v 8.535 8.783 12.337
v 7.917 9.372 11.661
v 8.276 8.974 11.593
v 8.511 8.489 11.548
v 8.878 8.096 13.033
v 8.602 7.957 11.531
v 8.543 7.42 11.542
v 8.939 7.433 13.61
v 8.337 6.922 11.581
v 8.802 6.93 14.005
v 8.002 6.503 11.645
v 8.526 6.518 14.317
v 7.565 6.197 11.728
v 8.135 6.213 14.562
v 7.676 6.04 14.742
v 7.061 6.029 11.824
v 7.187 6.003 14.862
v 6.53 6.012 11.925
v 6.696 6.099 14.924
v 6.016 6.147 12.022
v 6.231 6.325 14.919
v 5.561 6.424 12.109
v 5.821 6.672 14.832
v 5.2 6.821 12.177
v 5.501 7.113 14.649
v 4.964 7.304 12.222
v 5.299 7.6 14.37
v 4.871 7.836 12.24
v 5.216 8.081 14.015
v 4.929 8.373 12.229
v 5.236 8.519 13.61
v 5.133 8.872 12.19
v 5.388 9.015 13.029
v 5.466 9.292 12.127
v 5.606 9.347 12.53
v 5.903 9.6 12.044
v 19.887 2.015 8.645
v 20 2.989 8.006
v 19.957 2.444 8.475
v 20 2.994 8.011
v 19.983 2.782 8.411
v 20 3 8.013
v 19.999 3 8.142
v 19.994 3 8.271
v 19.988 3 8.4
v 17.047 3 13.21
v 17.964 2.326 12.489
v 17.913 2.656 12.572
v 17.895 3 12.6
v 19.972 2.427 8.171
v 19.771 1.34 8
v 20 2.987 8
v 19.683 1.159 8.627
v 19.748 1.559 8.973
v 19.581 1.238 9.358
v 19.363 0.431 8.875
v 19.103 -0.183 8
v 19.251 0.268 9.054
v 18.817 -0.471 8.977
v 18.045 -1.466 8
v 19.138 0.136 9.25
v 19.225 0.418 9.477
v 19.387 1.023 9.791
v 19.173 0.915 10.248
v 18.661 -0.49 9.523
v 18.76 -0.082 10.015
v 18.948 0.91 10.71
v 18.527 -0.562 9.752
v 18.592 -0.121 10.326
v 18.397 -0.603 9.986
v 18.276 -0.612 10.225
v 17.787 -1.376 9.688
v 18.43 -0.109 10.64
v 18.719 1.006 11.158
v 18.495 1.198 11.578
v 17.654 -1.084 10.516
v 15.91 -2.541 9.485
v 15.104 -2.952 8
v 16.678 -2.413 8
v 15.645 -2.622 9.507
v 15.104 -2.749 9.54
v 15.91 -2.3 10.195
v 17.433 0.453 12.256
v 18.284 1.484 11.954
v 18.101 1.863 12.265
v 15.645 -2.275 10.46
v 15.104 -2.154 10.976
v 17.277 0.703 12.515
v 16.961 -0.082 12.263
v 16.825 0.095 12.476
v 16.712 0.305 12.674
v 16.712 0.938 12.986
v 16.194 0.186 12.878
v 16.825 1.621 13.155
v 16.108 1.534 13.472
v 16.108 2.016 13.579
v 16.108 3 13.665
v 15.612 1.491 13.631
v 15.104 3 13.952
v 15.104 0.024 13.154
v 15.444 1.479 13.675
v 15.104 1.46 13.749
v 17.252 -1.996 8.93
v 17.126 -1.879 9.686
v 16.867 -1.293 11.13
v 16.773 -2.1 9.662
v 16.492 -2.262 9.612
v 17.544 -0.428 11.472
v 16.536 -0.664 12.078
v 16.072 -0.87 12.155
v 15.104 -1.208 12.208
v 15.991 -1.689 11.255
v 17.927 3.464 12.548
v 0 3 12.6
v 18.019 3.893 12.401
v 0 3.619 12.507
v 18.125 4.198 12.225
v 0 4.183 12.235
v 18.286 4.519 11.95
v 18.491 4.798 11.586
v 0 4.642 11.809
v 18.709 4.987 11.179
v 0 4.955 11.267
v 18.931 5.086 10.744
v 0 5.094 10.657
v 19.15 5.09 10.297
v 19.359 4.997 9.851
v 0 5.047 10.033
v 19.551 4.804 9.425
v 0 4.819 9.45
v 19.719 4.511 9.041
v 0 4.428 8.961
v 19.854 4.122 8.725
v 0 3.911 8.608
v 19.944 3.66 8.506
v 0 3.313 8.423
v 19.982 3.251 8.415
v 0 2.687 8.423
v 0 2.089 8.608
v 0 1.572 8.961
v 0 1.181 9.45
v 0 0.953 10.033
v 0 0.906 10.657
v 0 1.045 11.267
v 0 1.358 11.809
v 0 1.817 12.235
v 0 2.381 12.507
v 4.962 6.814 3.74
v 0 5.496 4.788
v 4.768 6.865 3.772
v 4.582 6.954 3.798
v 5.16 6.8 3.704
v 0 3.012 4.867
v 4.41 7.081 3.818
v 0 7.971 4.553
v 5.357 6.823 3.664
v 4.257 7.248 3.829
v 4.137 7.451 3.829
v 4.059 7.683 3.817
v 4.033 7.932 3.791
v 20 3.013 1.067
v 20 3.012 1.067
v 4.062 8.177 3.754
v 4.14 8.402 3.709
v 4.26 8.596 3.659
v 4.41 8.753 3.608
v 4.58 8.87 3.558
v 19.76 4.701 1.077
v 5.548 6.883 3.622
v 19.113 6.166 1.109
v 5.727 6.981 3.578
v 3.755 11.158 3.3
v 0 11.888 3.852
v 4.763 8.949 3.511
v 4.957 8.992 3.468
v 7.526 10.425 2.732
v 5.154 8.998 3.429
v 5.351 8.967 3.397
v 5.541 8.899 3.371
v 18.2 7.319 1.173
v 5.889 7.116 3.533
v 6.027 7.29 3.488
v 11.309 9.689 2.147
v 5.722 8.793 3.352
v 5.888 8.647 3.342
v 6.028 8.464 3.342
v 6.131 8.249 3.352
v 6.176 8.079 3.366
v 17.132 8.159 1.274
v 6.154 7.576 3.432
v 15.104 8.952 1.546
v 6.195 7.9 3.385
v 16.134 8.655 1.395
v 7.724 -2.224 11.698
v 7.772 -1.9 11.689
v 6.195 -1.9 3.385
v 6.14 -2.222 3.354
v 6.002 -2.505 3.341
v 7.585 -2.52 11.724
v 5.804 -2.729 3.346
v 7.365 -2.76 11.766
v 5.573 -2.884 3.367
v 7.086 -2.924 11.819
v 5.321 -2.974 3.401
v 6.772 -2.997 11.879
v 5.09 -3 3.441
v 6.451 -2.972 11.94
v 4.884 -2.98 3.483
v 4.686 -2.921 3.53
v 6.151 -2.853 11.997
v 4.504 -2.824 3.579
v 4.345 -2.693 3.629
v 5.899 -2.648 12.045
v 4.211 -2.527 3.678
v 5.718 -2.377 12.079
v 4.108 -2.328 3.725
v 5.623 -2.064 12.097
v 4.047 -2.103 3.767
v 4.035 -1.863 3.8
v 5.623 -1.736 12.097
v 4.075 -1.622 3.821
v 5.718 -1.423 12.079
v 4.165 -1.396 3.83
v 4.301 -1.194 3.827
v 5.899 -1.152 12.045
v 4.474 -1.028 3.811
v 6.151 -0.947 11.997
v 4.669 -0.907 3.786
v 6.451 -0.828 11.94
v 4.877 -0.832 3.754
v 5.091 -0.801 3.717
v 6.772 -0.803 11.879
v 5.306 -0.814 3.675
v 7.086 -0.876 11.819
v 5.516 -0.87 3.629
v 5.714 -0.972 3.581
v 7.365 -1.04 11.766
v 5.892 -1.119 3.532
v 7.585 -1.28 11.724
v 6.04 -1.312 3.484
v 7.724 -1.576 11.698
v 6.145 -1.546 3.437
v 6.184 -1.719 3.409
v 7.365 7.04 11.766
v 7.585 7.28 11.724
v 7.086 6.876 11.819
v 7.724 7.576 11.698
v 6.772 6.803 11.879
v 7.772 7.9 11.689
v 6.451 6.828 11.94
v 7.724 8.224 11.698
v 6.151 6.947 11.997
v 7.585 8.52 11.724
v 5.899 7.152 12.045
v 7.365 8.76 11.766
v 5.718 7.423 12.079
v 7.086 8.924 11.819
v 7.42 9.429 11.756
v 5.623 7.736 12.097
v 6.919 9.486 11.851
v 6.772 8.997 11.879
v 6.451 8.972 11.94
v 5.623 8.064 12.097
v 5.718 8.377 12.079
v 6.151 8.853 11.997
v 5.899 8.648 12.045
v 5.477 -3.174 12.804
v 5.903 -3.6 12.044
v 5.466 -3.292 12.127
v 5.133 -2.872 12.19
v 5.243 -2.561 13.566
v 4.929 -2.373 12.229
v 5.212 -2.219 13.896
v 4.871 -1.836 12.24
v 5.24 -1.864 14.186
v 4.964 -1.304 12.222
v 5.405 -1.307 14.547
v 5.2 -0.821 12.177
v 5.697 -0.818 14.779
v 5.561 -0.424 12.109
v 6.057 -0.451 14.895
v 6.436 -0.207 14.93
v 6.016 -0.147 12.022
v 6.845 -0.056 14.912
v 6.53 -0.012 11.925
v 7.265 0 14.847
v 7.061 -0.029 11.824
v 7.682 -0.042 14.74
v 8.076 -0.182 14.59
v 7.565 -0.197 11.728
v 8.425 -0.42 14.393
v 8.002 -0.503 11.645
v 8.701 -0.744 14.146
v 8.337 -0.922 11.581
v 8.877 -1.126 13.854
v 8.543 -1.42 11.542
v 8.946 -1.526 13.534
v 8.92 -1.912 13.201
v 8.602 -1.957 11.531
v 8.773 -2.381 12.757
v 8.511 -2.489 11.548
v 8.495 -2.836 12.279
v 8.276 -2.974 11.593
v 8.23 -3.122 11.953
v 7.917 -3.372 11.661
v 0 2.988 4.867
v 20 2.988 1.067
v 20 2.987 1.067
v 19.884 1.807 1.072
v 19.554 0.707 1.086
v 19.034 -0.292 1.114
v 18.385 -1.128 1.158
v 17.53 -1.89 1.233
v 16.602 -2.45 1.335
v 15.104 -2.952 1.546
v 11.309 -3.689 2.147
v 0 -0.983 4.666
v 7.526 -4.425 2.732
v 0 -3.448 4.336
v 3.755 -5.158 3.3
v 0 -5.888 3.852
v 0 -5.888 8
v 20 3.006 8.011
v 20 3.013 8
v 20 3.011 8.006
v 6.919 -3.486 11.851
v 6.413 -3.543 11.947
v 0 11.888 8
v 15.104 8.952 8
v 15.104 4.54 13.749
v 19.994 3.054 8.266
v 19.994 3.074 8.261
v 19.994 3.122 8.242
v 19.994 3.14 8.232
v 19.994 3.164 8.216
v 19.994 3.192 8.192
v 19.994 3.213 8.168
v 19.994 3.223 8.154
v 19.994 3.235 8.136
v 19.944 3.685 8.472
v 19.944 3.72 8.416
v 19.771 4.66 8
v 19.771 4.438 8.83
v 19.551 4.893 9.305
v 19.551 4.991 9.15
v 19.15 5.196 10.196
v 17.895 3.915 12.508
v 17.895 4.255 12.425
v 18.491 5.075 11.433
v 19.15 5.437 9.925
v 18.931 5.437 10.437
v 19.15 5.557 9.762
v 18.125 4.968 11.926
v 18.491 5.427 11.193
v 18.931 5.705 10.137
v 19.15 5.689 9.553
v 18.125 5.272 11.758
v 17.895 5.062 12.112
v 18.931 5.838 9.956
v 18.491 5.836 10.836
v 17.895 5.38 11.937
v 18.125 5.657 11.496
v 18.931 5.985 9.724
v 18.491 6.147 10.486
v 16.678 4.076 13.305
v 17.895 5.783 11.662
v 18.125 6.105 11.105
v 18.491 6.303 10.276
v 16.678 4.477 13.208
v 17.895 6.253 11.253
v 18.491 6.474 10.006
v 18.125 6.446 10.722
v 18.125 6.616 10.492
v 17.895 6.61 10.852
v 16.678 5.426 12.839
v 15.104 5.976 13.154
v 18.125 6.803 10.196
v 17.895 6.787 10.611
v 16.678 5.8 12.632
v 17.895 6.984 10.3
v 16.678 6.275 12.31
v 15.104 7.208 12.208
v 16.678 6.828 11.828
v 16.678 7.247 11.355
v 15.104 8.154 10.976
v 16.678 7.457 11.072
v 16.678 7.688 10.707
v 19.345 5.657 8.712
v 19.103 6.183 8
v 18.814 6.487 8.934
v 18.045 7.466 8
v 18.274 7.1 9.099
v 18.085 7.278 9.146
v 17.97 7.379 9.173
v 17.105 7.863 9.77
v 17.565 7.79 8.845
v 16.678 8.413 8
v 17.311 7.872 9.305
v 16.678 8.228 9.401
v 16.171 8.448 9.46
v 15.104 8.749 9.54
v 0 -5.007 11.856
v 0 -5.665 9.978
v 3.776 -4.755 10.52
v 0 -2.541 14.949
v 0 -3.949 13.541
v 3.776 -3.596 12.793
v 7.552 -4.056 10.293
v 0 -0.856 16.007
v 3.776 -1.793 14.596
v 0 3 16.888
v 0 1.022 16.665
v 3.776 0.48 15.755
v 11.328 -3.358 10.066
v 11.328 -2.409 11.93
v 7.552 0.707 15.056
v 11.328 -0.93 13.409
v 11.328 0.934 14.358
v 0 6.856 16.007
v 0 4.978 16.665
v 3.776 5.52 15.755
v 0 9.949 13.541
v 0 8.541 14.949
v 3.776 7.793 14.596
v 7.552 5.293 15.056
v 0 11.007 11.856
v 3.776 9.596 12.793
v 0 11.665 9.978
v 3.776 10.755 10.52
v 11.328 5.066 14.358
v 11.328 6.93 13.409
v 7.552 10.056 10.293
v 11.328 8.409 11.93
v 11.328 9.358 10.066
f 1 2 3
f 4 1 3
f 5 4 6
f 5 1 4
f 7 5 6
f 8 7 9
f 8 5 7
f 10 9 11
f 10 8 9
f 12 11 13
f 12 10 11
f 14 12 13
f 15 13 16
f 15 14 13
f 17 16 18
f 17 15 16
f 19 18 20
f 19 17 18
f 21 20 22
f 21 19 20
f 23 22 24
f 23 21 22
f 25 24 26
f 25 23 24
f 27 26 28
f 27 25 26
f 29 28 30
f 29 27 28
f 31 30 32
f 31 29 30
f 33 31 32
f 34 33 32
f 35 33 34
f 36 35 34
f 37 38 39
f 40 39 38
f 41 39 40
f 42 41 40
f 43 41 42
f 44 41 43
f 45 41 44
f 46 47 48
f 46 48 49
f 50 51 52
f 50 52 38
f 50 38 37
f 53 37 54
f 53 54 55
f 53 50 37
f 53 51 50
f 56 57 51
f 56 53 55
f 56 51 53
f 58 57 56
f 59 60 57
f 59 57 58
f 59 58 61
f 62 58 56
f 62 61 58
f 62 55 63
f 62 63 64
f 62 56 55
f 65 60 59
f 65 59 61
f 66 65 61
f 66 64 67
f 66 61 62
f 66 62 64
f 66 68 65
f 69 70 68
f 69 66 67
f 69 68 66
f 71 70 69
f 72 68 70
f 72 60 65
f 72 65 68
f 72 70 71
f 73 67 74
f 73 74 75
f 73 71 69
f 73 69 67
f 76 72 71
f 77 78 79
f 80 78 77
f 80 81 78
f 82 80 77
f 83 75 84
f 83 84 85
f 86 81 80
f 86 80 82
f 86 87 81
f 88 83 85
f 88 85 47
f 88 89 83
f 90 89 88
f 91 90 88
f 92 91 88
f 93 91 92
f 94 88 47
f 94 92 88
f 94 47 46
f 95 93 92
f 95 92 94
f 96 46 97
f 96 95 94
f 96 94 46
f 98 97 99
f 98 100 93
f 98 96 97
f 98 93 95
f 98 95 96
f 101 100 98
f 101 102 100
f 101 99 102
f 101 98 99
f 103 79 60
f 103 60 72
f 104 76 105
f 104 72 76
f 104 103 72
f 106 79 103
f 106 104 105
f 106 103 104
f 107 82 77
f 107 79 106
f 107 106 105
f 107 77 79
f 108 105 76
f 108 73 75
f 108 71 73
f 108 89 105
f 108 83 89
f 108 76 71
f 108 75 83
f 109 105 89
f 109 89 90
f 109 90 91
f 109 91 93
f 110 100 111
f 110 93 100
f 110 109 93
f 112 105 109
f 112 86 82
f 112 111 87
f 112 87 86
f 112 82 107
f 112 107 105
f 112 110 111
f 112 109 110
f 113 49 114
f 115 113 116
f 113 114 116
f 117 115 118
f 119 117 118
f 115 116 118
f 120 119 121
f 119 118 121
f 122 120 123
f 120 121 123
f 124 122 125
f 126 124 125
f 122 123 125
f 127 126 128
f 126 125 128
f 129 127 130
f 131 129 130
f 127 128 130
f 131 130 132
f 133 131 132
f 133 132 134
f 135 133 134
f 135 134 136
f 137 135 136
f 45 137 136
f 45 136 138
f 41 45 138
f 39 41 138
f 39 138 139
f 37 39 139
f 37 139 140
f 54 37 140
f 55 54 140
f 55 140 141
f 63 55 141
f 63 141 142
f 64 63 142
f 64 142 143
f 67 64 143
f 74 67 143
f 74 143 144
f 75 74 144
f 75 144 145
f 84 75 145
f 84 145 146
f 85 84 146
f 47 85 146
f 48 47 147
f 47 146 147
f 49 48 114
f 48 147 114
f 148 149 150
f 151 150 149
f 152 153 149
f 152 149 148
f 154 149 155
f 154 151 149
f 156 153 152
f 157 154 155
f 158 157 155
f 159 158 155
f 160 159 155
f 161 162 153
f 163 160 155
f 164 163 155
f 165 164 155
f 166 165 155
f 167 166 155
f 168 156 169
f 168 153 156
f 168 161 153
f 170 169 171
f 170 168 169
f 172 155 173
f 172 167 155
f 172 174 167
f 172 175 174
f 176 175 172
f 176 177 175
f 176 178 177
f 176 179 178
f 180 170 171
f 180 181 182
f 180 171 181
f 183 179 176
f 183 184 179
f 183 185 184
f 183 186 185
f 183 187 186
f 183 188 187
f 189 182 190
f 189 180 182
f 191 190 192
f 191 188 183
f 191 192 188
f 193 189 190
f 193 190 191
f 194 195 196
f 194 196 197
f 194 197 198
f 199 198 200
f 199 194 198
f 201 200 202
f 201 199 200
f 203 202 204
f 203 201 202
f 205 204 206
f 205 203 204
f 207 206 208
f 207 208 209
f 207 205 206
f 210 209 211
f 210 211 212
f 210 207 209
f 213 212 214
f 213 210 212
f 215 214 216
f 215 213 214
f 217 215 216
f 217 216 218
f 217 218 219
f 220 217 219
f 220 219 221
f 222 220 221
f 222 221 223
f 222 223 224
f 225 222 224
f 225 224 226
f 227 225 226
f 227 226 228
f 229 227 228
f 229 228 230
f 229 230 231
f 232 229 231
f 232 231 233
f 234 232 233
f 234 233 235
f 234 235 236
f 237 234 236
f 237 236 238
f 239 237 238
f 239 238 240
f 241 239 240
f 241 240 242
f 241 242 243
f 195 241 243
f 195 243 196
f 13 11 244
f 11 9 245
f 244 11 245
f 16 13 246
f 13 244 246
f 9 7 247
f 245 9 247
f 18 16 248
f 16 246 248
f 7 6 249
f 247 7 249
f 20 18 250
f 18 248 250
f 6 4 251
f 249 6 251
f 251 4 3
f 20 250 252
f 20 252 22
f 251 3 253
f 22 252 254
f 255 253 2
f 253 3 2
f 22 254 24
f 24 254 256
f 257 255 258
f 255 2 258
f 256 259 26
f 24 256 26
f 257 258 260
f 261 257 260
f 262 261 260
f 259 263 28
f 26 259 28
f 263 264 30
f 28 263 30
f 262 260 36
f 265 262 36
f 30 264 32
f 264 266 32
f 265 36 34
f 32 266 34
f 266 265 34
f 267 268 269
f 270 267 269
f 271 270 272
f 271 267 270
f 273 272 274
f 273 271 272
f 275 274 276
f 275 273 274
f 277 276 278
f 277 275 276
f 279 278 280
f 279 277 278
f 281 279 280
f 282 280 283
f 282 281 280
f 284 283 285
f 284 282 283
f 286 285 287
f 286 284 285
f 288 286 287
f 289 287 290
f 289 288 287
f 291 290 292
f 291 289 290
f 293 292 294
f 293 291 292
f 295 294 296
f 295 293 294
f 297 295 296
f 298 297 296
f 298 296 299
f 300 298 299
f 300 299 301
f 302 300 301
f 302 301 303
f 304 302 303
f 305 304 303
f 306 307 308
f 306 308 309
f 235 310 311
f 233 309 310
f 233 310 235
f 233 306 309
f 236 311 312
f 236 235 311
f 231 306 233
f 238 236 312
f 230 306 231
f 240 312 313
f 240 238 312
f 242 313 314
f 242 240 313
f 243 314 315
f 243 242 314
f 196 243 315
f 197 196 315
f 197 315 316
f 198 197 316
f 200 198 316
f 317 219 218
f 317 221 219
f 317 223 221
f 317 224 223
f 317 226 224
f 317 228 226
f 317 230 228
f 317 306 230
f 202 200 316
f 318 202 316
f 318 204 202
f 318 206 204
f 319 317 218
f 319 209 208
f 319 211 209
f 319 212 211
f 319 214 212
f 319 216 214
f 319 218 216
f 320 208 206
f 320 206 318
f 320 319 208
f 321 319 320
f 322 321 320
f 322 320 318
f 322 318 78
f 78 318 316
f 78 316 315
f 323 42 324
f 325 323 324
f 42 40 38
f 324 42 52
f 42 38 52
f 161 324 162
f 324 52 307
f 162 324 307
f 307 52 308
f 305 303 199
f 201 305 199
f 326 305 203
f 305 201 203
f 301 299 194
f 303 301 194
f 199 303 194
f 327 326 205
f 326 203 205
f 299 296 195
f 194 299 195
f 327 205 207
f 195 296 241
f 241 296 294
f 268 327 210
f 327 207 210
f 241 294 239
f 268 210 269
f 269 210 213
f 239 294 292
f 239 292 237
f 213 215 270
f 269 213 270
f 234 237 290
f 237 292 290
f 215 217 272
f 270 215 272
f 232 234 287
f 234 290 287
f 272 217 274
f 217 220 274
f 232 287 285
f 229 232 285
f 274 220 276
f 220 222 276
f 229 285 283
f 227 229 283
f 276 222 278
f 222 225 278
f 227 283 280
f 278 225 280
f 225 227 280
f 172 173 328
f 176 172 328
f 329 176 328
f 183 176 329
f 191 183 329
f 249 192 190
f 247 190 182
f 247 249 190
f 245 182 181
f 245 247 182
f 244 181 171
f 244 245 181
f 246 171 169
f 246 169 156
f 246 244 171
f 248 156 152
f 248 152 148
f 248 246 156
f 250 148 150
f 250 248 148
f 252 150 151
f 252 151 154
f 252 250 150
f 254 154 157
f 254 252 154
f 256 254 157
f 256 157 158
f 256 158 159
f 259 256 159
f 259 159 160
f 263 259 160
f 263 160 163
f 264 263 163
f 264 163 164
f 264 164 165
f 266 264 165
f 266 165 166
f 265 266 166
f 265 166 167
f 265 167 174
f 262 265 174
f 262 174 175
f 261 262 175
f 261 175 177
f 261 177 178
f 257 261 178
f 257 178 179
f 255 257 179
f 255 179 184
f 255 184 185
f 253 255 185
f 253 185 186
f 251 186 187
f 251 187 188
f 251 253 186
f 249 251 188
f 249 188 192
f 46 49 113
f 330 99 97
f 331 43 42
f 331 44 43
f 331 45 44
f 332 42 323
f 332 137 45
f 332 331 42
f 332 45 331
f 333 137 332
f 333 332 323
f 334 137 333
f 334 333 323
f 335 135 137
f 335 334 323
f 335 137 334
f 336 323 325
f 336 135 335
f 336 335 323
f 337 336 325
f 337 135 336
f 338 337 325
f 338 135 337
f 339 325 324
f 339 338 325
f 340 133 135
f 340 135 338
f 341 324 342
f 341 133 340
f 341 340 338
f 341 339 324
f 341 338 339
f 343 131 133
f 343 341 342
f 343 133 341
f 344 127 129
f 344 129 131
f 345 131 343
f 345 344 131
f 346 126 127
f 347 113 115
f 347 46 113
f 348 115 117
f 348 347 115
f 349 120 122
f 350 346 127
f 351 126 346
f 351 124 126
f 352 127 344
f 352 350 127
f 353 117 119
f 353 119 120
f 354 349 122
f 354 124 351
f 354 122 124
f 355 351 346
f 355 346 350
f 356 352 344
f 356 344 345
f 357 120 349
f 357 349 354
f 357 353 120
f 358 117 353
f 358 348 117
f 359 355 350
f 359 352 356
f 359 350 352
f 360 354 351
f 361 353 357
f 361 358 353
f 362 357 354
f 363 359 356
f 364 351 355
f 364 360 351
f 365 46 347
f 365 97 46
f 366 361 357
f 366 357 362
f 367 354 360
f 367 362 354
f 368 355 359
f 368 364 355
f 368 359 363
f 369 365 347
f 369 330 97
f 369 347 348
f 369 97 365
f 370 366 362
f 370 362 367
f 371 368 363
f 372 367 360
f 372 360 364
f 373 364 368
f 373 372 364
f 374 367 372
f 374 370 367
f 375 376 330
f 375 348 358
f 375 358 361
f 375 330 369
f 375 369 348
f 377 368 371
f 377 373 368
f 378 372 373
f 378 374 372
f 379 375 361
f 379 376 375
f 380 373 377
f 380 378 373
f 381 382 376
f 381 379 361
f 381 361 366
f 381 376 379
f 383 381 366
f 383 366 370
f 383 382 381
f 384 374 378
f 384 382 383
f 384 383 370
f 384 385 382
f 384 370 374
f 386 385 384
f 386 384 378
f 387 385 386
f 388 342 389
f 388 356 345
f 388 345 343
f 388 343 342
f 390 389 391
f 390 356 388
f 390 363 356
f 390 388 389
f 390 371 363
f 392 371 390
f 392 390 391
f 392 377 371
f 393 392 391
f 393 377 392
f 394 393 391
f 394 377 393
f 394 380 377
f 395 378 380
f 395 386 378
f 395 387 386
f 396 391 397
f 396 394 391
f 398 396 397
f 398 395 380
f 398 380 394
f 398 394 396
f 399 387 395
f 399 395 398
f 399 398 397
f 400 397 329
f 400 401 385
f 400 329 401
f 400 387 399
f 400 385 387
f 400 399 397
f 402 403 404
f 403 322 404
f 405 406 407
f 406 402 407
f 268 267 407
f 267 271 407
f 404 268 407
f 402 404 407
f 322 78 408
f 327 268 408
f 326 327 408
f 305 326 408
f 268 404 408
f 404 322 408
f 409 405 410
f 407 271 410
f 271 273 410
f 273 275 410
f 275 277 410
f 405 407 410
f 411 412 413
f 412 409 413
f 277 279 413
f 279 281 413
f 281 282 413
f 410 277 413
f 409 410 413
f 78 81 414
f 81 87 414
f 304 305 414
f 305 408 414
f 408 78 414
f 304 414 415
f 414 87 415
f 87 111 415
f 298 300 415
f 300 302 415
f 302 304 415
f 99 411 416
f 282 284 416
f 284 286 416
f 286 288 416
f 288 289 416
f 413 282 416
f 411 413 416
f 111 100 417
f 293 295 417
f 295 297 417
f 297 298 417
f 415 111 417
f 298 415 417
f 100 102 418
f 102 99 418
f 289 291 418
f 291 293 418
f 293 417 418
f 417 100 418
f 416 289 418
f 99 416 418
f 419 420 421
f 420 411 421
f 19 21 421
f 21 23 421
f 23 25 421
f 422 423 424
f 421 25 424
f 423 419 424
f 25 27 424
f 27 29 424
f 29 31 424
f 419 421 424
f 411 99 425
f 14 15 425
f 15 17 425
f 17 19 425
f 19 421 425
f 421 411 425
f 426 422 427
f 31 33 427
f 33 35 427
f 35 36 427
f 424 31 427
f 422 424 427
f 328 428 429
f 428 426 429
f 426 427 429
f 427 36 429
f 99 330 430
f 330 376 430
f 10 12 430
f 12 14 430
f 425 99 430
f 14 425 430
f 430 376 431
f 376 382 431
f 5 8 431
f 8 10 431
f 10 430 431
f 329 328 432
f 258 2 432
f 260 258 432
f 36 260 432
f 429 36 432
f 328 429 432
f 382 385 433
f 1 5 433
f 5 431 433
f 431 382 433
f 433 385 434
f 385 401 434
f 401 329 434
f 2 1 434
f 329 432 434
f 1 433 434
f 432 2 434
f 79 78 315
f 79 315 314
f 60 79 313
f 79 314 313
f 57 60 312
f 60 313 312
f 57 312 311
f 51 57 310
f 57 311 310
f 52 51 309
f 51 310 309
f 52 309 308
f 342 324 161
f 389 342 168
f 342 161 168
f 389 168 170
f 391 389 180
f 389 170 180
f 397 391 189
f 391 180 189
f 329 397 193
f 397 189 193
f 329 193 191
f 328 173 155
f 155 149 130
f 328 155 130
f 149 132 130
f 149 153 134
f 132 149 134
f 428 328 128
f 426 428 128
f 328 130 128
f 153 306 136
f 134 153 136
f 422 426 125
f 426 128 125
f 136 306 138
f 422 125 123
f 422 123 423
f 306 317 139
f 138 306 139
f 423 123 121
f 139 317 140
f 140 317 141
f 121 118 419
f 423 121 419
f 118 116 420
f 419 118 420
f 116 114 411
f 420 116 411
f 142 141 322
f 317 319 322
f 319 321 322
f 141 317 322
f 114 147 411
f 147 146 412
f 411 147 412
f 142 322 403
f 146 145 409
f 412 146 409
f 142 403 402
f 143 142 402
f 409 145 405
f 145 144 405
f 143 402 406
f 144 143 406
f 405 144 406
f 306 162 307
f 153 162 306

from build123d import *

# Parameters (mm, degrees)
ESQUISSE1_W                  = 20
ESQUISSE1_H                  = 18
BOSS_EXTRU_1_DEPTH           = 17
ENL_V_MAT_EXTRU_1_DEPTH      = 32.827660926
ENL_V_MAT_EXTRU_1_DEPTH_BACK = 32.827660926
ESQUISSE4_W                  = 22.812140382
ESQUISSE4_H                  = 17.8
ENL_V_MAT_EXTRU_3_DEPTH      = 1
CONG_2_R                     = 40
ESQUISSE5_R                  = 2.1
ENL_V_MAT_EXTRU_4_DEPTH      = 29.861739379
CONG_3_R                     = 9
CHANFREIN1_SIZE              = 20.578216064
CHANFREIN1_SIZE_2            = 4
CONG_4_R                     = 6.05
ESQUISSE6_R                  = 1.1
ENL_V_MAT_EXTRU_5_DEPTH      = 252.816113418
ESQUISSE10_R                 = 1.9
ENL_V_MAT_EXTRU_6_DEPTH      = 7.5


# Some blends are built 0.0001 mm under size
with BuildPart() as part:
    # Esquisse1 → Boss.-Extru.1 (new body)
    with BuildSketch(Plane.XY):
        with Locations((10, 3)):
            Rectangle(ESQUISSE1_W, ESQUISSE1_H)
    extrude(amount=BOSS_EXTRU_1_DEPTH)

    # Esquisse2 → Enlèv. mat.-Extru.1 (cut, two sides: drawn at the far end of the back side and taken through both)
    with BuildSketch(Plane(origin=(0, 12, 0), x_dir=(1, 0, 0), z_dir=(0, 1, 0)).offset(-ENL_V_MAT_EXTRU_1_DEPTH_BACK)):
        Polygon((81.461522254, 11.626508335), (20.045630921, -0.0408989), (0, -3.849042594), (0, 0), (0, 62.514319158), (66.24104297, 168.553390377), (147.702565224, 117.665579555), align=None)
    extrude(amount=ENL_V_MAT_EXTRU_1_DEPTH + ENL_V_MAT_EXTRU_1_DEPTH_BACK, mode=Mode.SUBTRACT)

    # Esquisse4 → Enlèv. mat.-Extru.3 (cut)
    with BuildSketch(Plane(origin=(0.705746644, 0, 3.714969257), x_dir=(-0.9824291803850712, 0, 0.1866357562952965), z_dir=(-0.1866357562952965, 0, -0.9824291803850712))):
        with Locations((-8.233262334, 3)):
            Rectangle(ESQUISSE4_W, ESQUISSE4_H)
    extrude(amount=-ENL_V_MAT_EXTRU_3_DEPTH, mode=Mode.SUBTRACT)

    # Congé2
    # the kernel refuses this fillet: 40 mm, written as the material it adds along each edge
    with BuildSketch(Plane(origin=(41.830053891, 11.9, -3.079684565), x_dir=(0, -1, 0), z_dir=(-0.9824291803850712, 0, 0.1866357562952965))) as cong_2_piece_1_section:
        with BuildLine():
            CenterArc((8.888194417, -40), CONG_2_R, 90, 12.838568141)
            Line((0, -1), (0, 0))
            Line((0, 0), (8.888194417, 0))
        make_face()
    cong_2_piece_1 = extrude(amount=64.798673587, mode=Mode.PRIVATE)
    cong_2_piece_1 = split(cong_2_piece_1, bisect_by=Plane(origin=(20, 11.9, -3.079684565), z_dir=(-1, 0, 0)), keep=Keep.TOP, mode=Mode.PRIVATE)
    cong_2_piece_1 = split(cong_2_piece_1, bisect_by=Plane(origin=(0, 11.9, -3.079684565), z_dir=(1, 0, 0)), keep=Keep.TOP, mode=Mode.PRIVATE)
    add(cong_2_piece_1)
    with BuildSketch(Plane(origin=(-21.830053891, -5.9, 9.014064887), x_dir=(-0.1866357562952965, 0, -0.9824291803850712), z_dir=(0.9824291803850712, 0, -0.1866357562952965))) as cong_2_piece_2_section:
        with BuildLine():
            CenterArc((40, 8.888194417), CONG_2_R, 180, 12.838568141)
            Line((0, 8.888194417), (0, 0))
            Line((0, 0), (1, 0))
        make_face()
    cong_2_piece_2 = extrude(amount=64.798673587, mode=Mode.PRIVATE)
    cong_2_piece_2 = split(cong_2_piece_2, bisect_by=Plane(origin=(20, -5.9, 9.014064887), z_dir=(-1, 0, 0)), keep=Keep.TOP, mode=Mode.PRIVATE)
    cong_2_piece_2 = split(cong_2_piece_2, bisect_by=Plane(origin=(0, -5.9, 9.014064887), z_dir=(1, 0, 0)), keep=Keep.TOP, mode=Mode.PRIVATE)
    add(cong_2_piece_2)

    # Esquisse5 → Enlèv. mat.-Extru.4 (cut, through all)
    with BuildSketch(Plane.ZY):
        with Locations((10.5, 3)):
            Circle(ESQUISSE5_R)
    extrude(amount=-ENL_V_MAT_EXTRU_4_DEPTH, mode=Mode.SUBTRACT)

    # Congé3
    cong_3_edges = [part.edges().sort_by_distance(p)[0] for p in [
        (10, 12, 17),
        (10, -6, 17),
    ]]
    fillet(cong_3_edges, radius=CONG_3_R - 0.0001)  # a hair under: the kernel refuses the full size

    # Chanfrein1
    # the kernel refuses this chamfer: 20.578216064, 4 mm, written as the material it takes off along each edge
    with BuildSketch(Plane(origin=(20, -6, -53.417428004), x_dir=(-1, 0, 0), z_dir=(0, 0, 1))) as chanfrein1_piece_1:
        Polygon((CHANFREIN1_SIZE, 0), (0, -CHANFREIN1_SIZE_2), (0, 0), align=None)
    extrude(amount=61.417528004, mode=Mode.SUBTRACT)
    with BuildSketch(Plane(origin=(20, 2.9999, 8.0001), x_dir=(0, -1, 0), z_dir=(0, 0, -1))) as chanfrein1_piece_2:
        Polygon((8.9999, CHANFREIN1_SIZE), (8.9999 - CHANFREIN1_SIZE_2, 0), (8.9999, 0), align=None)
    revolve(axis=Axis((20, 2.9999, 8.0001), (-1, 0, 0)), revolution_arc=90, mode=Mode.SUBTRACT)
    with BuildSketch(Plane(origin=(20, 3.0001, 8.0001), x_dir=(0, 0, 1), z_dir=(0, -1, 0))) as chanfrein1_piece_3:
        Polygon((8.9999, CHANFREIN1_SIZE), (8.9999 - CHANFREIN1_SIZE_2, 0), (8.9999, 0), align=None)
    revolve(axis=Axis((20, 3.0001, 8.0001), (-1, 0, 0)), revolution_arc=90, mode=Mode.SUBTRACT)
    with BuildSketch(Plane(origin=(20, 12, -53.417428004), x_dir=(-1, 0, 0), z_dir=(0, 0, 1))) as chanfrein1_piece_4:
        Polygon((CHANFREIN1_SIZE, 0), (0, CHANFREIN1_SIZE_2), (0, 0), align=None)
    extrude(amount=61.417528004, mode=Mode.SUBTRACT)
    with BuildSketch(Plane(origin=(20, 2.9999, 17), x_dir=(-1, 0, 0), z_dir=(0, 1, 0))) as chanfrein1_piece_5:
        Polygon((CHANFREIN1_SIZE, 0), (0, -CHANFREIN1_SIZE_2), (0, 0), align=None)
    extrude(amount=0.0002, mode=Mode.SUBTRACT)

    # Congé4
    # the kernel refuses this fillet: 6.05 mm, written as the material it takes off along each edge
    with BuildSketch(Plane(origin=(20, -2, -11.718464458), x_dir=(-0.9816271834478701, -0.1908089953754837, 0), z_dir=(0, 0, 1))) as cong_4_piece_1:
        with BuildLine():
            CenterArc((CONG_4_R * 0.824336385818, -CONG_4_R), CONG_4_R, 90, 79)
            Line((-CONG_4_R * 0.157290797629, -CONG_4_R * 0.809191004625), (0, 0))
            Line((0, 0), (CONG_4_R * 0.824336385818, 0))
        make_face()
    extrude(amount=19.718564458, mode=Mode.SUBTRACT)
    with BuildSketch(Plane(origin=(20, 2.9999, 8.0001), x_dir=(0, -1, 0), z_dir=(0, 0, -1))) as cong_4_piece_2:
        with BuildLine():
            CenterArc((4.9999 - CONG_4_R * 0.824336385818, CONG_4_R), CONG_4_R, 270, 79)
            Line((4.9999 - CONG_4_R * 0.824336385818, 0), (4.9999, 0))
            Line((4.9999, 0), (4.9999 + CONG_4_R * 0.157290797629, CONG_4_R * 0.809191004625))
        make_face()
    revolve(axis=Axis((20, 2.9999, 8.0001), (-1, 0, 0)), revolution_arc=90, mode=Mode.SUBTRACT)
    with BuildSketch(Plane(origin=(20, 3.0001, 8.0001), x_dir=(0, 0, 1), z_dir=(0, -1, 0))) as cong_4_piece_3:
        with BuildLine():
            CenterArc((4.9999 - CONG_4_R * 0.824336385818, CONG_4_R), CONG_4_R, 270, 79)
            Line((4.9999 - CONG_4_R * 0.824336385818, 0), (4.9999, 0))
            Line((4.9999, 0), (4.9999 + CONG_4_R * 0.157290797629, CONG_4_R * 0.809191004625))
        make_face()
    revolve(axis=Axis((20, 3.0001, 8.0001), (-1, 0, 0)), revolution_arc=90, mode=Mode.SUBTRACT)
    with BuildSketch(Plane(origin=(20, 8, -11.718464458), x_dir=(-0.9816271834478701, 0.1908089953754837, 0), z_dir=(0, 0, 1))) as cong_4_piece_4:
        with BuildLine():
            CenterArc((CONG_4_R * 0.824336385818, CONG_4_R), CONG_4_R, 191, 79)
            Line((-CONG_4_R * 0.157290797629, CONG_4_R * 0.809191004625), (0, 0))
            Line((0, 0), (CONG_4_R * 0.824336385818, 0))
        make_face()
    extrude(amount=19.718564458, mode=Mode.SUBTRACT)
    with BuildSketch(Plane(origin=(20, 2.9999, 13), x_dir=(-0.9816271834478701, 0, 0.1908089953754837), z_dir=(0, 1, 0))) as cong_4_piece_5:
        with BuildLine():
            CenterArc((CONG_4_R * 0.824336385818, -CONG_4_R), CONG_4_R, 90, 79)
            Line((-CONG_4_R * 0.157290797629, -CONG_4_R * 0.809191004625), (0, 0))
            Line((0, 0), (CONG_4_R * 0.824336385818, 0))
        make_face()
    extrude(amount=0.0002, mode=Mode.SUBTRACT)

    # Esquisse6 → Enlèv. mat.-Extru.5 (cut, through all)
    with BuildSketch(Plane(origin=(247.804103642, 0, -26.276800017), x_dir=(-0.9824291803850712, 0, 0.1866357562952965), z_dir=(-0.1866357562952965, 0, -0.9824291803850712))):
        with Locations(Location((244, 7.9, 0), (0, 0, 180))):
            Circle(ESQUISSE6_R)
        with Locations(Location((244, -1.9, 0), (0, 0, 180))):
            Circle(ESQUISSE6_R)
    extrude(amount=ENL_V_MAT_EXTRU_5_DEPTH, mode=Mode.SUBTRACT)

    # Esquisse10 → Enlèv. mat.-Extru.6 (cut)
    with BuildSketch(Plane(origin=(3.813717133, 0, 20.074968868), x_dir=(-0.9824291803850712, 0, 0.1866357562952965), z_dir=(-0.1866357562952965, 0, -0.9824291803850712))):
        with Locations((-4.4, 7.9)):
            Circle(ESQUISSE10_R)
        with Locations((-4.4, -1.9)):
            Circle(ESQUISSE10_R)
    extrude(amount=ENL_V_MAT_EXTRU_6_DEPTH, mode=Mode.SUBTRACT)


solid = part.part
